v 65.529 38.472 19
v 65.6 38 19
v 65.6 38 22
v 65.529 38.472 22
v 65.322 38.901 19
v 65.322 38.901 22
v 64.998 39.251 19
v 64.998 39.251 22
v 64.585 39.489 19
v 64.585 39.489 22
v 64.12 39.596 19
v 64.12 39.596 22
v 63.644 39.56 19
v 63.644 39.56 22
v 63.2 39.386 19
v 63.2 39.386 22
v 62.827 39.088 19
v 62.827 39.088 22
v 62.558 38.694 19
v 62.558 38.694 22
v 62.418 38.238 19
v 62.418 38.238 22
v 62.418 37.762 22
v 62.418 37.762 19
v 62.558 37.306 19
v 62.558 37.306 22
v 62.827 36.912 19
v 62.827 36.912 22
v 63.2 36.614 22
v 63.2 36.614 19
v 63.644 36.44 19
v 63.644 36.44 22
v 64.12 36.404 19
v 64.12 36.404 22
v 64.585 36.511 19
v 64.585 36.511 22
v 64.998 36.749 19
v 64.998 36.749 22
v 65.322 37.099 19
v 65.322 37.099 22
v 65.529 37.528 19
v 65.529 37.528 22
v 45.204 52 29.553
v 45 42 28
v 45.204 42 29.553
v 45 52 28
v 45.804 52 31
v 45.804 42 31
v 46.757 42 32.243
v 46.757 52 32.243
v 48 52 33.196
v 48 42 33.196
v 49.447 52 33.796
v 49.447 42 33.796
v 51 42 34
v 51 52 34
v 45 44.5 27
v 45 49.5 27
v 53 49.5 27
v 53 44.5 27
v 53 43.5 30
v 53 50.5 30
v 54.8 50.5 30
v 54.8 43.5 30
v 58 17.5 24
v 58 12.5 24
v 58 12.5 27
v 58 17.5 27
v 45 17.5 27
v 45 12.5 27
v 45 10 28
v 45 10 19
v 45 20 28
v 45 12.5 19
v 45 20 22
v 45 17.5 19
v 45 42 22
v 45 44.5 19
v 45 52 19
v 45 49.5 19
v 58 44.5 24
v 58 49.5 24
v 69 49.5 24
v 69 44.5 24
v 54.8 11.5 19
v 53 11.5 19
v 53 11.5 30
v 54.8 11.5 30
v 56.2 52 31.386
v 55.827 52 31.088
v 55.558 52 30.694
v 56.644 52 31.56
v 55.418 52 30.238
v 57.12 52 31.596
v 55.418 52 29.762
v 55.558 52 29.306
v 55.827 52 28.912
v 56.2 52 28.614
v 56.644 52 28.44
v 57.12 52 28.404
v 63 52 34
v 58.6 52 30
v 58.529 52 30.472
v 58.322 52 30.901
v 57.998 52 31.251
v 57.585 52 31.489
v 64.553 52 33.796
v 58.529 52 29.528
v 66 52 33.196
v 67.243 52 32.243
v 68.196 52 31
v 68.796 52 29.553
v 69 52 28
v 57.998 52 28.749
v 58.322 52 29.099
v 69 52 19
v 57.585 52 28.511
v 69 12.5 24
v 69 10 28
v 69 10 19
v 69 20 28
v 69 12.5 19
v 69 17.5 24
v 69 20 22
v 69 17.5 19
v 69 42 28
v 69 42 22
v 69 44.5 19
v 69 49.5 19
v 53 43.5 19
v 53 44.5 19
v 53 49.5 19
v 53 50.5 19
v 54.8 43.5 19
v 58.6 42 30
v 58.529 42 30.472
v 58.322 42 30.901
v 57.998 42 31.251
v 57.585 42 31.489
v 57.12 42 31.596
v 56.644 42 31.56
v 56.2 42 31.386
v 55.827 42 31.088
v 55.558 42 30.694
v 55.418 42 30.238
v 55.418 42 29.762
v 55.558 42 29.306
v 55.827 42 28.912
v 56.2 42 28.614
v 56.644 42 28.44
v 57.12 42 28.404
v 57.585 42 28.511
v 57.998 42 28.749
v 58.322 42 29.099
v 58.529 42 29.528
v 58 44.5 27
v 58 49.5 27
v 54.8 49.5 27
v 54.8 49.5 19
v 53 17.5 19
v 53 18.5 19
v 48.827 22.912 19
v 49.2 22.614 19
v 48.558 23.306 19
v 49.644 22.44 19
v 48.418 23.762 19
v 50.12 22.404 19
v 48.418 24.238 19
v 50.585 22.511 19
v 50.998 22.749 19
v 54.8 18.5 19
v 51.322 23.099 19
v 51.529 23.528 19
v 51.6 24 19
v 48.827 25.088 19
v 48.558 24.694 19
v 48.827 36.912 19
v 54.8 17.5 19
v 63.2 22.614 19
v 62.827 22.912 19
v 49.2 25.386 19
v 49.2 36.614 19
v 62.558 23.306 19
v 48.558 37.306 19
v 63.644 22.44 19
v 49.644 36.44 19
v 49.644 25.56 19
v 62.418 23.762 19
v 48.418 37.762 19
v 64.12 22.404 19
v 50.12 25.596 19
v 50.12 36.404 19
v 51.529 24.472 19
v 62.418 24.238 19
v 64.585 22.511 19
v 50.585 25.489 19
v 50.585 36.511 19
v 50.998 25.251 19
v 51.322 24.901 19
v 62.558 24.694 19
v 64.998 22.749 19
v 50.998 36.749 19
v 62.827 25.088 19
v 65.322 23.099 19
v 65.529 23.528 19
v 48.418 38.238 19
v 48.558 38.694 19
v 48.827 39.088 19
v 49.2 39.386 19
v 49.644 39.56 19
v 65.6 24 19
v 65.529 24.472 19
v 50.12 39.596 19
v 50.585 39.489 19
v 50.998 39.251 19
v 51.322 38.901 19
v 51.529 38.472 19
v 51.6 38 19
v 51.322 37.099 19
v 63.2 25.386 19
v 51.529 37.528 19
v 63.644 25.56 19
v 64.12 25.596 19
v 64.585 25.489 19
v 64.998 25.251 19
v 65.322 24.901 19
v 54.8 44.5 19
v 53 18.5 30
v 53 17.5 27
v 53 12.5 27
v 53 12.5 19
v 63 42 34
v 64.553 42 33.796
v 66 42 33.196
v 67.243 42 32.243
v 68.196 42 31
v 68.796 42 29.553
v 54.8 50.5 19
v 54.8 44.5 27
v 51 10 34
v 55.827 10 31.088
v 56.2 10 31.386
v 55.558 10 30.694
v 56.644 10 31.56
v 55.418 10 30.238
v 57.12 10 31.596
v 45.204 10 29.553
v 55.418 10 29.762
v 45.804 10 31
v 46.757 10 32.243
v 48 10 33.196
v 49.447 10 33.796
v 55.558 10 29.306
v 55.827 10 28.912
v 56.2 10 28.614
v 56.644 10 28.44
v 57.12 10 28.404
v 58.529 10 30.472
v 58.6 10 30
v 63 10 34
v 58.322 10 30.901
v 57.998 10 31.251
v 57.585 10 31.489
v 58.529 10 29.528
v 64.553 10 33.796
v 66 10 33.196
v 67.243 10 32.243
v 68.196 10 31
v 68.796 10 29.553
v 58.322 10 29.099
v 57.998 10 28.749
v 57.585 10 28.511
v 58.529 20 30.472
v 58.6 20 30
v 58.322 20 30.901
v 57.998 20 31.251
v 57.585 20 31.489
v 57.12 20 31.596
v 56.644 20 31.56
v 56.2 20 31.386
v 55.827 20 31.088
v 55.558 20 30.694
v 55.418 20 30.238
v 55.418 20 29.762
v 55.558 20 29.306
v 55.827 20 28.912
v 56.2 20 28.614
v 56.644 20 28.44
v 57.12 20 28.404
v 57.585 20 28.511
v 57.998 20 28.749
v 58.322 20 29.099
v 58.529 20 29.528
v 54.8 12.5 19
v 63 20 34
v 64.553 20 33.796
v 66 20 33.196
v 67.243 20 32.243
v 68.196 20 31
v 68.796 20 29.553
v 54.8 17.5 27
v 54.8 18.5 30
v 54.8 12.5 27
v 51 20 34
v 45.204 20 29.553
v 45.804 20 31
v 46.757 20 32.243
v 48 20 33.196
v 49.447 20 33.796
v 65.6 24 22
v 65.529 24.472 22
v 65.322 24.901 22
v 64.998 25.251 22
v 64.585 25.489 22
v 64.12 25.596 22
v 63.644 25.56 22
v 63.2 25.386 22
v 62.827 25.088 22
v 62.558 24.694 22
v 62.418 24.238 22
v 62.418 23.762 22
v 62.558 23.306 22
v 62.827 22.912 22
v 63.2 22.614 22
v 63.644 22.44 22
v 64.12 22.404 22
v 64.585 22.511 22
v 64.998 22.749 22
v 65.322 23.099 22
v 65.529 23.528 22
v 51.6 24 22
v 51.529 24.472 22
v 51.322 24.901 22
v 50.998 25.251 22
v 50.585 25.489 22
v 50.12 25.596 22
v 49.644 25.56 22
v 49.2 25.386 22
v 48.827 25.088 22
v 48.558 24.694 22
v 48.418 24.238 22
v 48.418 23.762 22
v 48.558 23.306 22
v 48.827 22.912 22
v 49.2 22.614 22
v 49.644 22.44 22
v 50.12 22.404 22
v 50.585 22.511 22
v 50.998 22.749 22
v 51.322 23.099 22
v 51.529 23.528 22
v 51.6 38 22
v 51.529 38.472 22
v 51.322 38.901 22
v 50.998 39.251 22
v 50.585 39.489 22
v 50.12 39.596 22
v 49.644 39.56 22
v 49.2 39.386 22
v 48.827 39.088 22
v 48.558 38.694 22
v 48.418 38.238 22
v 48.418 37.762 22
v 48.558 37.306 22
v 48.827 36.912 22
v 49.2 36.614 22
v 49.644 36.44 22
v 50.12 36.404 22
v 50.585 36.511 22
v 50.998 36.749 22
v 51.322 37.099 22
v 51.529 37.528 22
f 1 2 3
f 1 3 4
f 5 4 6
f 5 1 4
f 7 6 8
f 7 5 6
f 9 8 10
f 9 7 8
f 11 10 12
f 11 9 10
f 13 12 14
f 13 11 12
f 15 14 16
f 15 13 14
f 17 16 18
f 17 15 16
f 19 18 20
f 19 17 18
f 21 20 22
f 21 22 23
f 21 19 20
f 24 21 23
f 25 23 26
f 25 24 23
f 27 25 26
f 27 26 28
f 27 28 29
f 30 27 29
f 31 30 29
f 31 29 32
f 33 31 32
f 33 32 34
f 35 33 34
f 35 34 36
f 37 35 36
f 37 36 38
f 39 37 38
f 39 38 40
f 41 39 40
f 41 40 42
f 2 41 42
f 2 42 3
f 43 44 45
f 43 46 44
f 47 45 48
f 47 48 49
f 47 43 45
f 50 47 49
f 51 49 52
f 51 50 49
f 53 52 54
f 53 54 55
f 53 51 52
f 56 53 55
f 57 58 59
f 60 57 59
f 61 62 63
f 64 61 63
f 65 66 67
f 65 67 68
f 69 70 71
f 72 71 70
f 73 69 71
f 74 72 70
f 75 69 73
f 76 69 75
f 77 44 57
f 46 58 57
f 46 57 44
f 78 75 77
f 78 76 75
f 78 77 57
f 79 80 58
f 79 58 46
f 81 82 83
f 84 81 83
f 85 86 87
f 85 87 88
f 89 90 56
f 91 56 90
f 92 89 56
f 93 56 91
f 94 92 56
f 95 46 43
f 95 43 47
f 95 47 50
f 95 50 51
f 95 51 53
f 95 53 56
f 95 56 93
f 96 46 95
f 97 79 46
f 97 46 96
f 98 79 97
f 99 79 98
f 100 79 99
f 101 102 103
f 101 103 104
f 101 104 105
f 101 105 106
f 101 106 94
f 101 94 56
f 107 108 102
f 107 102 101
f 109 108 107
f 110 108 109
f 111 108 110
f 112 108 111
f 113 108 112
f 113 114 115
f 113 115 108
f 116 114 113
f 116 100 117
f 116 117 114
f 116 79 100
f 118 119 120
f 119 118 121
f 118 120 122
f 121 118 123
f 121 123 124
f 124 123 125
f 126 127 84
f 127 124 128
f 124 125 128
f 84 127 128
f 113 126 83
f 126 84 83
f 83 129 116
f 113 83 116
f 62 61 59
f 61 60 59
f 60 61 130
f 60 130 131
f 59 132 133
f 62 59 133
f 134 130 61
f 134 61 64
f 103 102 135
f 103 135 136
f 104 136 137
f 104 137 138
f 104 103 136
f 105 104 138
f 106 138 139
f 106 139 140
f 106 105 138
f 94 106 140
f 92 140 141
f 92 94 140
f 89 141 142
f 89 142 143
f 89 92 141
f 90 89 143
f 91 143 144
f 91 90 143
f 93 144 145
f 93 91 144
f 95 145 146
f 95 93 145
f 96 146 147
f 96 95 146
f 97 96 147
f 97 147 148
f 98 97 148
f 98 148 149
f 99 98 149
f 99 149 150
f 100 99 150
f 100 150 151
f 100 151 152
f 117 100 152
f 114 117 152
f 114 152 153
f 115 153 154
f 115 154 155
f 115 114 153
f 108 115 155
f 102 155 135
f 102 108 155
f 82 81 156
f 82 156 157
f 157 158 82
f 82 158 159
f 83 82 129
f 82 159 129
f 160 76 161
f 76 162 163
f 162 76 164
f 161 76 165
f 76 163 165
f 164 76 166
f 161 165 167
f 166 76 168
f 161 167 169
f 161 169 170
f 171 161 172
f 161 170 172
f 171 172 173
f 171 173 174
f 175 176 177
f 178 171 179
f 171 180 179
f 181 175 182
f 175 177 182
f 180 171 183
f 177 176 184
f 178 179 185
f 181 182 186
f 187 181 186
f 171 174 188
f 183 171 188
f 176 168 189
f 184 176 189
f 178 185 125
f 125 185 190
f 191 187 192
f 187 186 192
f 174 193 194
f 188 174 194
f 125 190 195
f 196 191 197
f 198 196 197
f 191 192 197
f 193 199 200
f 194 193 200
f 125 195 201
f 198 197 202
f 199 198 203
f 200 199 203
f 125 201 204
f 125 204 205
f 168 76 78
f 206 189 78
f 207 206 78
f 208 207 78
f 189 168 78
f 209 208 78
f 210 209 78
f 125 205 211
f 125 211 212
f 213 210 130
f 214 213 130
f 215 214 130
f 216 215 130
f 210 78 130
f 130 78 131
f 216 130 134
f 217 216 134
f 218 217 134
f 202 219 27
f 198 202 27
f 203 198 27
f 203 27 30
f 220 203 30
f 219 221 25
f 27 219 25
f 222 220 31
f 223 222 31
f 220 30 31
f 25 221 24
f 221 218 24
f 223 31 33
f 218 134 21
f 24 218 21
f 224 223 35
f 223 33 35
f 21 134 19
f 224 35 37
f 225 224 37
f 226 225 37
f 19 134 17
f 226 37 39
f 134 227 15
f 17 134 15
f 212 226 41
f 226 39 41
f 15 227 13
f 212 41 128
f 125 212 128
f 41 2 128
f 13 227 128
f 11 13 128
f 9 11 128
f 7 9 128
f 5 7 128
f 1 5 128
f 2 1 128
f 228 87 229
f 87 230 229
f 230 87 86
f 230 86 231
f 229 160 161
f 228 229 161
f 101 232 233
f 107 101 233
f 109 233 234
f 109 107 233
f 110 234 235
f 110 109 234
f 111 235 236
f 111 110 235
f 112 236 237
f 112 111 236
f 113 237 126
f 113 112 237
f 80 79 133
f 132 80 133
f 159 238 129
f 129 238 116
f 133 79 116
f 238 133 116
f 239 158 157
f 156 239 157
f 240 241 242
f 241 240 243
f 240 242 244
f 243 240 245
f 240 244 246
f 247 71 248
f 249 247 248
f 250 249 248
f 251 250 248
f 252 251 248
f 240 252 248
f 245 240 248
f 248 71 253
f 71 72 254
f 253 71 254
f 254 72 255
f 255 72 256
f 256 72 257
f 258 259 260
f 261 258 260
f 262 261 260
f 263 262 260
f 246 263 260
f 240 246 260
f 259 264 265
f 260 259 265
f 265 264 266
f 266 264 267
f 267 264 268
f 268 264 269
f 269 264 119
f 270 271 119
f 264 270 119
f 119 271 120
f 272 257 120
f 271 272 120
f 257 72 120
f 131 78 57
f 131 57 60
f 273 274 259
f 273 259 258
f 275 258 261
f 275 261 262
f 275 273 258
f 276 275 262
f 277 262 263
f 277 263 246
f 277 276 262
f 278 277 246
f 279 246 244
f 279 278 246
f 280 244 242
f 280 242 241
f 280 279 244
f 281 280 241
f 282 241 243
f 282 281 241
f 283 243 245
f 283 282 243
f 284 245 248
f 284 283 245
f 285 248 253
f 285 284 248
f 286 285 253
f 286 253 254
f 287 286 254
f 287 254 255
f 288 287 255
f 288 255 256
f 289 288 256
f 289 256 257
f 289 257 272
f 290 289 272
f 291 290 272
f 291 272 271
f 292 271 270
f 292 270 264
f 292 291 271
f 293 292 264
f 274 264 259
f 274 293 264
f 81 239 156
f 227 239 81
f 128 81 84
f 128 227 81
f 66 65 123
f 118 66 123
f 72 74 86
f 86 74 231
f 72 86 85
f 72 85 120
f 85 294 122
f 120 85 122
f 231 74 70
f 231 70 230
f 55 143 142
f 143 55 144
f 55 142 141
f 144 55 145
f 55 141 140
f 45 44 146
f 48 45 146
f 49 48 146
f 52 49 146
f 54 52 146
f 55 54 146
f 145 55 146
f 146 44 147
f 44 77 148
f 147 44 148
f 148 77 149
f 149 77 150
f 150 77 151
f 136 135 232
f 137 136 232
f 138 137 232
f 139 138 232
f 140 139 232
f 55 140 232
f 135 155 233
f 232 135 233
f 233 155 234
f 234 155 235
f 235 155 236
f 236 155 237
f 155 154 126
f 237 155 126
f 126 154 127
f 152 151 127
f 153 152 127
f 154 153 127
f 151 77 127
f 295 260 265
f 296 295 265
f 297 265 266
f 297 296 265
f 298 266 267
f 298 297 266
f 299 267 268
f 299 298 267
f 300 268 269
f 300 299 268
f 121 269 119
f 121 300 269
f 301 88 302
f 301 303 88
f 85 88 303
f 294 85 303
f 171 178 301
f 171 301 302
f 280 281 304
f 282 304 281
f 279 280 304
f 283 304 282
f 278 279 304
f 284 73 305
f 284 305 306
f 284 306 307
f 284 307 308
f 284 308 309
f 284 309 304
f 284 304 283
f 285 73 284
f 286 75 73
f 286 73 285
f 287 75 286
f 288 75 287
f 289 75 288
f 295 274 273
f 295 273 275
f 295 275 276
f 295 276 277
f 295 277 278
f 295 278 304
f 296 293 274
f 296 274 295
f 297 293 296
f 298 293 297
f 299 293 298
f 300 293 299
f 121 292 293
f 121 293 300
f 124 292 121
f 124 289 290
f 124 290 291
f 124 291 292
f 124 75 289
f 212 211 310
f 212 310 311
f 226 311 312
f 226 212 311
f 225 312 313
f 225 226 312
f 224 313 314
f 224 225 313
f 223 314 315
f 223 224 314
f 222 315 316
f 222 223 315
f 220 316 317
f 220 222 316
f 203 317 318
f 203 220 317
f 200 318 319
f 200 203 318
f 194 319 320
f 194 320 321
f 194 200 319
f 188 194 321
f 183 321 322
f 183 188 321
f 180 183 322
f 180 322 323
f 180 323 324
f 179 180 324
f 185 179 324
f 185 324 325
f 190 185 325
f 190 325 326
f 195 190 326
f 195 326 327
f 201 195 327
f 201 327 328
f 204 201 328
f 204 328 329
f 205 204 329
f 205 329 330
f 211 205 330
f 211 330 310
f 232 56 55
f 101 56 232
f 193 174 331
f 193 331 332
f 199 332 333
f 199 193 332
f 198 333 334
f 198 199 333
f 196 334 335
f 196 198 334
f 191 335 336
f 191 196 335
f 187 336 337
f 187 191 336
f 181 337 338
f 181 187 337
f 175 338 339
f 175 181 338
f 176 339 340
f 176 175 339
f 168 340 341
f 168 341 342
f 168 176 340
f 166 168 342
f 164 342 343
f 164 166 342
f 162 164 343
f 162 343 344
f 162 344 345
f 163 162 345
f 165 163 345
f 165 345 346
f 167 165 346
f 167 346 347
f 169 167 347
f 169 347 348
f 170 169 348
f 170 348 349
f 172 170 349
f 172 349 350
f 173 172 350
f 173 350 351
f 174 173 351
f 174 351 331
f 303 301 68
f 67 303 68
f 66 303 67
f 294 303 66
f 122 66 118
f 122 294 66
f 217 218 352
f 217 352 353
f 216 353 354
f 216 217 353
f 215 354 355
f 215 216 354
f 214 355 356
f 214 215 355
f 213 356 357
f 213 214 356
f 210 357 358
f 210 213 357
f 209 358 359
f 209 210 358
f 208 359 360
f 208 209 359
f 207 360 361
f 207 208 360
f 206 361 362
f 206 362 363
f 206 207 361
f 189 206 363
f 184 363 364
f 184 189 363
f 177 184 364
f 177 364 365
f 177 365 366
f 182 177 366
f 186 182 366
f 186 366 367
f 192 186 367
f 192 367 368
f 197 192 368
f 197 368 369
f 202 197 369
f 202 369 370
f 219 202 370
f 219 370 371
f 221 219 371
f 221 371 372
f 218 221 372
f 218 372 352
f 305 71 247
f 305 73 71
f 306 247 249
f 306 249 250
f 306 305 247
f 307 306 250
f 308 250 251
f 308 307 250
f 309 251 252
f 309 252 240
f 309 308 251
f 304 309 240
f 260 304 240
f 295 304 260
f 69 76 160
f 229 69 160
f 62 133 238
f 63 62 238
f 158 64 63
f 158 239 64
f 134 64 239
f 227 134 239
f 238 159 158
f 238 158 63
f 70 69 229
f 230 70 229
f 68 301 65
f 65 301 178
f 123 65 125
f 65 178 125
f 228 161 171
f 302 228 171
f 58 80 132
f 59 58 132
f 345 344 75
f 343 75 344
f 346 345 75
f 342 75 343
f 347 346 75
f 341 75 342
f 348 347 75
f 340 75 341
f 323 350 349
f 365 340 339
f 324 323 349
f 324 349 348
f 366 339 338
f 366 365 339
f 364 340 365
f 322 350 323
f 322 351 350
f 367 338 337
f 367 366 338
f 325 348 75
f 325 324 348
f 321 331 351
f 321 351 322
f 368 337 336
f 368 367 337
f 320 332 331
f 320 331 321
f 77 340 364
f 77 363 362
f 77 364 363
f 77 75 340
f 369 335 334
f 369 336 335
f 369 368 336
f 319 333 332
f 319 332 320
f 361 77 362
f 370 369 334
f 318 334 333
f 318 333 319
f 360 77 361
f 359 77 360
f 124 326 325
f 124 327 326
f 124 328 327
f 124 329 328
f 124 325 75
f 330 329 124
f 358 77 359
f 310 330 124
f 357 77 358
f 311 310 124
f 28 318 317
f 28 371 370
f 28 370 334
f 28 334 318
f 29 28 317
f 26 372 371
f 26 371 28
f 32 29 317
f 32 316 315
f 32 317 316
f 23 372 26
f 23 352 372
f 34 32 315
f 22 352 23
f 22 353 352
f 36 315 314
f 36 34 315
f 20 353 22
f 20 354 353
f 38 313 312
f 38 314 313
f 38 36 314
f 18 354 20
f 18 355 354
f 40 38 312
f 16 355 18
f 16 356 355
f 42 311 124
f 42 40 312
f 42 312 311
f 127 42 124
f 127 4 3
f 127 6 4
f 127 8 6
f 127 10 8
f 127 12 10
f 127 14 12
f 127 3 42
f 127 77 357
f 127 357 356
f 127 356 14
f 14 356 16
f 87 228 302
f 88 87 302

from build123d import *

# Parameters (mm, degrees)
CYLINDER171_R     = 1.6
CYLINDER171_DEPTH = 10
CYLINDER173_R     = 1.6
CYLINDER173_DEPTH = 10
CYLINDER172_R     = 1.6
CYLINDER172_DEPTH = 10
CYLINDER170_R     = 1.6
CYLINDER170_DEPTH = 10
CYLINDER169_R     = 1.6
CYLINDER169_DEPTH = 10
BOX090_W          = 19
BOX090_H          = 5
BOX090_DEPTH      = 5
BOX089_W          = 4
BOX089_H          = 5
BOX089_DEPTH      = 8
BOX088_W          = 1.8
BOX088_H          = 7
BOX088_DEPTH      = 11
BOX086_W          = 8
BOX086_H          = 5
BOX086_DEPTH      = 8
BOX087_W          = 24
BOX087_H          = 10
BOX087_DEPTH      = 15
FILLET048_R       = 6
BOX091_W          = 24
BOX091_H          = 22
BOX091_DEPTH      = 3
FILLET047_R       = 6


with BuildPart() as cylinder171:
    # Cylinder171 → Cylinder171 (new body)
    with BuildSketch(Plane(origin=(50, 24, 12), x_dir=(1, 0, 0), z_dir=(0, 0, 1))):
        Circle(CYLINDER171_R)
    extrude(amount=CYLINDER171_DEPTH)


with BuildPart() as cylinder173:
    # Cylinder173 → Cylinder173 (new body)
    with BuildSketch(Plane(origin=(64, 24, 12), x_dir=(1, 0, 0), z_dir=(0, 0, 1))):
        Circle(CYLINDER173_R)
    extrude(amount=CYLINDER173_DEPTH)


with BuildPart() as cylinder172:
    # Cylinder172 → Cylinder172 (new body)
    with BuildSketch(Plane(origin=(64, 38, 12), x_dir=(1, 0, 0), z_dir=(0, 0, 1))):
        Circle(CYLINDER172_R)
    extrude(amount=CYLINDER172_DEPTH)


with BuildPart() as fusion152:
    # Cylinder170 → Cylinder170 (new body)
    with BuildSketch(Plane(origin=(50, 38, 12), x_dir=(1, 0, 0), z_dir=(0, 0, 1))):
        Circle(CYLINDER170_R)
    extrude(amount=CYLINDER170_DEPTH)

    # Fusion152: union Cylinder171, Cylinder173, Cylinder172
    add(cylinder171.part)
    add(cylinder173.part)
    add(cylinder172.part)


with BuildPart() as cylinder169:
    # Cylinder169 → Cylinder169 (new body)
    with BuildSketch(Plane(origin=(57, 52, 30), x_dir=(1, 0, 0), z_dir=(0, -1, 0))):
        Circle(CYLINDER169_R)
    extrude(amount=CYLINDER169_DEPTH)


with BuildPart() as cube058:
    # Box090 → Box090 (new body)
    with BuildSketch(Plane(origin=(54, 44.5, 19), x_dir=(1, 0, 0), z_dir=(0, 0, 1))):
        with Locations((9.5, 2.5)):
            Rectangle(BOX090_W, BOX090_H)
    extrude(amount=BOX090_DEPTH)


with BuildPart() as cube057:
    # Box089 → Box089 (new body)
    with BuildSketch(Plane(origin=(54, 44.5, 19), x_dir=(1, 0, 0), z_dir=(0, 0, 1))):
        with Locations((2, 2.5)):
            Rectangle(BOX089_W, BOX089_H)
    extrude(amount=BOX089_DEPTH)


with BuildPart() as cube056:
    # Box088 → Box088 (new body)
    with BuildSketch(Plane(origin=(53, 43.5, 19), x_dir=(1, 0, 0), z_dir=(0, 0, 1))):
        with Locations((0.9, 3.5)):
            Rectangle(BOX088_W, BOX088_H)
    extrude(amount=BOX088_DEPTH)


with BuildPart() as cube054:
    # Box086 → Box086 (new body)
    with BuildSketch(Plane(origin=(45, 44.5, 19), x_dir=(1, 0, 0), z_dir=(0, 0, 1))):
        with Locations((4, 2.5)):
            Rectangle(BOX086_W, BOX086_H)
    extrude(amount=BOX086_DEPTH)


with BuildPart() as cut106:
    # Box087 → Box087 (new body)
    with BuildSketch(Plane(origin=(45, 42, 19), x_dir=(1, 0, 0), z_dir=(0, 0, 1))):
        with Locations((12, 5)):
            Rectangle(BOX087_W, BOX087_H)
    extrude(amount=BOX087_DEPTH)

    # Cut103: cut Cube054
    add(cube054.part, mode=Mode.SUBTRACT)

    # Cut104: cut Cube056
    add(cube056.part, mode=Mode.SUBTRACT)

    # Cut105: cut Cube057
    add(cube057.part, mode=Mode.SUBTRACT)

    # Cut106: cut Cube058
    add(cube058.part, mode=Mode.SUBTRACT)


with BuildPart() as fillet048:
    # Cut108 base: copy of Cut106
    add(cut106.part)

    # Cut108: cut Cylinder169
    add(cylinder169.part, mode=Mode.SUBTRACT)

    # Fillet048
    fillet048_edges = [fillet048.edges().sort_by_distance(p)[0] for p in [
        (45, 47, 34),
        (69, 47, 34),
    ]]
    fillet(fillet048_edges, radius=FILLET048_R)


with BuildPart() as cube059:
    # Box091 → Box091 (new body)
    with BuildSketch(Plane(origin=(45, 20, 19), x_dir=(1, 0, 0), z_dir=(0, 0, 1))):
        with Locations((12, 11)):
            Rectangle(BOX091_W, BOX091_H)
    extrude(amount=BOX091_DEPTH)


with BuildPart() as fake_cylinder_holder:
    # Cut107 base: copy of Cut106
    add(cut106.part)

    # Cut107: cut Cylinder169
    add(cylinder169.part, mode=Mode.SUBTRACT)

    # Fillet047
    fillet047_edges = [fake_cylinder_holder.edges().sort_by_distance(p)[0] for p in [
        (45, 47, 34),
        (69, 47, 34),
    ]]
    fillet(fillet047_edges, radius=FILLET047_R)


with BuildPart() as fake_cylinder_holder_1:
    # Fillet047 placement: moved
    add(fake_cylinder_holder.part.moved(Location((0, -32, 0))))

    # Fusion151: union Fillet048, Cube059
    add(fillet048.part)
    add(cube059.part)

    # Cut110: cut Fusion152
    add(fusion152.part, mode=Mode.SUBTRACT)


solid = fake_cylinder_holder_1.part
